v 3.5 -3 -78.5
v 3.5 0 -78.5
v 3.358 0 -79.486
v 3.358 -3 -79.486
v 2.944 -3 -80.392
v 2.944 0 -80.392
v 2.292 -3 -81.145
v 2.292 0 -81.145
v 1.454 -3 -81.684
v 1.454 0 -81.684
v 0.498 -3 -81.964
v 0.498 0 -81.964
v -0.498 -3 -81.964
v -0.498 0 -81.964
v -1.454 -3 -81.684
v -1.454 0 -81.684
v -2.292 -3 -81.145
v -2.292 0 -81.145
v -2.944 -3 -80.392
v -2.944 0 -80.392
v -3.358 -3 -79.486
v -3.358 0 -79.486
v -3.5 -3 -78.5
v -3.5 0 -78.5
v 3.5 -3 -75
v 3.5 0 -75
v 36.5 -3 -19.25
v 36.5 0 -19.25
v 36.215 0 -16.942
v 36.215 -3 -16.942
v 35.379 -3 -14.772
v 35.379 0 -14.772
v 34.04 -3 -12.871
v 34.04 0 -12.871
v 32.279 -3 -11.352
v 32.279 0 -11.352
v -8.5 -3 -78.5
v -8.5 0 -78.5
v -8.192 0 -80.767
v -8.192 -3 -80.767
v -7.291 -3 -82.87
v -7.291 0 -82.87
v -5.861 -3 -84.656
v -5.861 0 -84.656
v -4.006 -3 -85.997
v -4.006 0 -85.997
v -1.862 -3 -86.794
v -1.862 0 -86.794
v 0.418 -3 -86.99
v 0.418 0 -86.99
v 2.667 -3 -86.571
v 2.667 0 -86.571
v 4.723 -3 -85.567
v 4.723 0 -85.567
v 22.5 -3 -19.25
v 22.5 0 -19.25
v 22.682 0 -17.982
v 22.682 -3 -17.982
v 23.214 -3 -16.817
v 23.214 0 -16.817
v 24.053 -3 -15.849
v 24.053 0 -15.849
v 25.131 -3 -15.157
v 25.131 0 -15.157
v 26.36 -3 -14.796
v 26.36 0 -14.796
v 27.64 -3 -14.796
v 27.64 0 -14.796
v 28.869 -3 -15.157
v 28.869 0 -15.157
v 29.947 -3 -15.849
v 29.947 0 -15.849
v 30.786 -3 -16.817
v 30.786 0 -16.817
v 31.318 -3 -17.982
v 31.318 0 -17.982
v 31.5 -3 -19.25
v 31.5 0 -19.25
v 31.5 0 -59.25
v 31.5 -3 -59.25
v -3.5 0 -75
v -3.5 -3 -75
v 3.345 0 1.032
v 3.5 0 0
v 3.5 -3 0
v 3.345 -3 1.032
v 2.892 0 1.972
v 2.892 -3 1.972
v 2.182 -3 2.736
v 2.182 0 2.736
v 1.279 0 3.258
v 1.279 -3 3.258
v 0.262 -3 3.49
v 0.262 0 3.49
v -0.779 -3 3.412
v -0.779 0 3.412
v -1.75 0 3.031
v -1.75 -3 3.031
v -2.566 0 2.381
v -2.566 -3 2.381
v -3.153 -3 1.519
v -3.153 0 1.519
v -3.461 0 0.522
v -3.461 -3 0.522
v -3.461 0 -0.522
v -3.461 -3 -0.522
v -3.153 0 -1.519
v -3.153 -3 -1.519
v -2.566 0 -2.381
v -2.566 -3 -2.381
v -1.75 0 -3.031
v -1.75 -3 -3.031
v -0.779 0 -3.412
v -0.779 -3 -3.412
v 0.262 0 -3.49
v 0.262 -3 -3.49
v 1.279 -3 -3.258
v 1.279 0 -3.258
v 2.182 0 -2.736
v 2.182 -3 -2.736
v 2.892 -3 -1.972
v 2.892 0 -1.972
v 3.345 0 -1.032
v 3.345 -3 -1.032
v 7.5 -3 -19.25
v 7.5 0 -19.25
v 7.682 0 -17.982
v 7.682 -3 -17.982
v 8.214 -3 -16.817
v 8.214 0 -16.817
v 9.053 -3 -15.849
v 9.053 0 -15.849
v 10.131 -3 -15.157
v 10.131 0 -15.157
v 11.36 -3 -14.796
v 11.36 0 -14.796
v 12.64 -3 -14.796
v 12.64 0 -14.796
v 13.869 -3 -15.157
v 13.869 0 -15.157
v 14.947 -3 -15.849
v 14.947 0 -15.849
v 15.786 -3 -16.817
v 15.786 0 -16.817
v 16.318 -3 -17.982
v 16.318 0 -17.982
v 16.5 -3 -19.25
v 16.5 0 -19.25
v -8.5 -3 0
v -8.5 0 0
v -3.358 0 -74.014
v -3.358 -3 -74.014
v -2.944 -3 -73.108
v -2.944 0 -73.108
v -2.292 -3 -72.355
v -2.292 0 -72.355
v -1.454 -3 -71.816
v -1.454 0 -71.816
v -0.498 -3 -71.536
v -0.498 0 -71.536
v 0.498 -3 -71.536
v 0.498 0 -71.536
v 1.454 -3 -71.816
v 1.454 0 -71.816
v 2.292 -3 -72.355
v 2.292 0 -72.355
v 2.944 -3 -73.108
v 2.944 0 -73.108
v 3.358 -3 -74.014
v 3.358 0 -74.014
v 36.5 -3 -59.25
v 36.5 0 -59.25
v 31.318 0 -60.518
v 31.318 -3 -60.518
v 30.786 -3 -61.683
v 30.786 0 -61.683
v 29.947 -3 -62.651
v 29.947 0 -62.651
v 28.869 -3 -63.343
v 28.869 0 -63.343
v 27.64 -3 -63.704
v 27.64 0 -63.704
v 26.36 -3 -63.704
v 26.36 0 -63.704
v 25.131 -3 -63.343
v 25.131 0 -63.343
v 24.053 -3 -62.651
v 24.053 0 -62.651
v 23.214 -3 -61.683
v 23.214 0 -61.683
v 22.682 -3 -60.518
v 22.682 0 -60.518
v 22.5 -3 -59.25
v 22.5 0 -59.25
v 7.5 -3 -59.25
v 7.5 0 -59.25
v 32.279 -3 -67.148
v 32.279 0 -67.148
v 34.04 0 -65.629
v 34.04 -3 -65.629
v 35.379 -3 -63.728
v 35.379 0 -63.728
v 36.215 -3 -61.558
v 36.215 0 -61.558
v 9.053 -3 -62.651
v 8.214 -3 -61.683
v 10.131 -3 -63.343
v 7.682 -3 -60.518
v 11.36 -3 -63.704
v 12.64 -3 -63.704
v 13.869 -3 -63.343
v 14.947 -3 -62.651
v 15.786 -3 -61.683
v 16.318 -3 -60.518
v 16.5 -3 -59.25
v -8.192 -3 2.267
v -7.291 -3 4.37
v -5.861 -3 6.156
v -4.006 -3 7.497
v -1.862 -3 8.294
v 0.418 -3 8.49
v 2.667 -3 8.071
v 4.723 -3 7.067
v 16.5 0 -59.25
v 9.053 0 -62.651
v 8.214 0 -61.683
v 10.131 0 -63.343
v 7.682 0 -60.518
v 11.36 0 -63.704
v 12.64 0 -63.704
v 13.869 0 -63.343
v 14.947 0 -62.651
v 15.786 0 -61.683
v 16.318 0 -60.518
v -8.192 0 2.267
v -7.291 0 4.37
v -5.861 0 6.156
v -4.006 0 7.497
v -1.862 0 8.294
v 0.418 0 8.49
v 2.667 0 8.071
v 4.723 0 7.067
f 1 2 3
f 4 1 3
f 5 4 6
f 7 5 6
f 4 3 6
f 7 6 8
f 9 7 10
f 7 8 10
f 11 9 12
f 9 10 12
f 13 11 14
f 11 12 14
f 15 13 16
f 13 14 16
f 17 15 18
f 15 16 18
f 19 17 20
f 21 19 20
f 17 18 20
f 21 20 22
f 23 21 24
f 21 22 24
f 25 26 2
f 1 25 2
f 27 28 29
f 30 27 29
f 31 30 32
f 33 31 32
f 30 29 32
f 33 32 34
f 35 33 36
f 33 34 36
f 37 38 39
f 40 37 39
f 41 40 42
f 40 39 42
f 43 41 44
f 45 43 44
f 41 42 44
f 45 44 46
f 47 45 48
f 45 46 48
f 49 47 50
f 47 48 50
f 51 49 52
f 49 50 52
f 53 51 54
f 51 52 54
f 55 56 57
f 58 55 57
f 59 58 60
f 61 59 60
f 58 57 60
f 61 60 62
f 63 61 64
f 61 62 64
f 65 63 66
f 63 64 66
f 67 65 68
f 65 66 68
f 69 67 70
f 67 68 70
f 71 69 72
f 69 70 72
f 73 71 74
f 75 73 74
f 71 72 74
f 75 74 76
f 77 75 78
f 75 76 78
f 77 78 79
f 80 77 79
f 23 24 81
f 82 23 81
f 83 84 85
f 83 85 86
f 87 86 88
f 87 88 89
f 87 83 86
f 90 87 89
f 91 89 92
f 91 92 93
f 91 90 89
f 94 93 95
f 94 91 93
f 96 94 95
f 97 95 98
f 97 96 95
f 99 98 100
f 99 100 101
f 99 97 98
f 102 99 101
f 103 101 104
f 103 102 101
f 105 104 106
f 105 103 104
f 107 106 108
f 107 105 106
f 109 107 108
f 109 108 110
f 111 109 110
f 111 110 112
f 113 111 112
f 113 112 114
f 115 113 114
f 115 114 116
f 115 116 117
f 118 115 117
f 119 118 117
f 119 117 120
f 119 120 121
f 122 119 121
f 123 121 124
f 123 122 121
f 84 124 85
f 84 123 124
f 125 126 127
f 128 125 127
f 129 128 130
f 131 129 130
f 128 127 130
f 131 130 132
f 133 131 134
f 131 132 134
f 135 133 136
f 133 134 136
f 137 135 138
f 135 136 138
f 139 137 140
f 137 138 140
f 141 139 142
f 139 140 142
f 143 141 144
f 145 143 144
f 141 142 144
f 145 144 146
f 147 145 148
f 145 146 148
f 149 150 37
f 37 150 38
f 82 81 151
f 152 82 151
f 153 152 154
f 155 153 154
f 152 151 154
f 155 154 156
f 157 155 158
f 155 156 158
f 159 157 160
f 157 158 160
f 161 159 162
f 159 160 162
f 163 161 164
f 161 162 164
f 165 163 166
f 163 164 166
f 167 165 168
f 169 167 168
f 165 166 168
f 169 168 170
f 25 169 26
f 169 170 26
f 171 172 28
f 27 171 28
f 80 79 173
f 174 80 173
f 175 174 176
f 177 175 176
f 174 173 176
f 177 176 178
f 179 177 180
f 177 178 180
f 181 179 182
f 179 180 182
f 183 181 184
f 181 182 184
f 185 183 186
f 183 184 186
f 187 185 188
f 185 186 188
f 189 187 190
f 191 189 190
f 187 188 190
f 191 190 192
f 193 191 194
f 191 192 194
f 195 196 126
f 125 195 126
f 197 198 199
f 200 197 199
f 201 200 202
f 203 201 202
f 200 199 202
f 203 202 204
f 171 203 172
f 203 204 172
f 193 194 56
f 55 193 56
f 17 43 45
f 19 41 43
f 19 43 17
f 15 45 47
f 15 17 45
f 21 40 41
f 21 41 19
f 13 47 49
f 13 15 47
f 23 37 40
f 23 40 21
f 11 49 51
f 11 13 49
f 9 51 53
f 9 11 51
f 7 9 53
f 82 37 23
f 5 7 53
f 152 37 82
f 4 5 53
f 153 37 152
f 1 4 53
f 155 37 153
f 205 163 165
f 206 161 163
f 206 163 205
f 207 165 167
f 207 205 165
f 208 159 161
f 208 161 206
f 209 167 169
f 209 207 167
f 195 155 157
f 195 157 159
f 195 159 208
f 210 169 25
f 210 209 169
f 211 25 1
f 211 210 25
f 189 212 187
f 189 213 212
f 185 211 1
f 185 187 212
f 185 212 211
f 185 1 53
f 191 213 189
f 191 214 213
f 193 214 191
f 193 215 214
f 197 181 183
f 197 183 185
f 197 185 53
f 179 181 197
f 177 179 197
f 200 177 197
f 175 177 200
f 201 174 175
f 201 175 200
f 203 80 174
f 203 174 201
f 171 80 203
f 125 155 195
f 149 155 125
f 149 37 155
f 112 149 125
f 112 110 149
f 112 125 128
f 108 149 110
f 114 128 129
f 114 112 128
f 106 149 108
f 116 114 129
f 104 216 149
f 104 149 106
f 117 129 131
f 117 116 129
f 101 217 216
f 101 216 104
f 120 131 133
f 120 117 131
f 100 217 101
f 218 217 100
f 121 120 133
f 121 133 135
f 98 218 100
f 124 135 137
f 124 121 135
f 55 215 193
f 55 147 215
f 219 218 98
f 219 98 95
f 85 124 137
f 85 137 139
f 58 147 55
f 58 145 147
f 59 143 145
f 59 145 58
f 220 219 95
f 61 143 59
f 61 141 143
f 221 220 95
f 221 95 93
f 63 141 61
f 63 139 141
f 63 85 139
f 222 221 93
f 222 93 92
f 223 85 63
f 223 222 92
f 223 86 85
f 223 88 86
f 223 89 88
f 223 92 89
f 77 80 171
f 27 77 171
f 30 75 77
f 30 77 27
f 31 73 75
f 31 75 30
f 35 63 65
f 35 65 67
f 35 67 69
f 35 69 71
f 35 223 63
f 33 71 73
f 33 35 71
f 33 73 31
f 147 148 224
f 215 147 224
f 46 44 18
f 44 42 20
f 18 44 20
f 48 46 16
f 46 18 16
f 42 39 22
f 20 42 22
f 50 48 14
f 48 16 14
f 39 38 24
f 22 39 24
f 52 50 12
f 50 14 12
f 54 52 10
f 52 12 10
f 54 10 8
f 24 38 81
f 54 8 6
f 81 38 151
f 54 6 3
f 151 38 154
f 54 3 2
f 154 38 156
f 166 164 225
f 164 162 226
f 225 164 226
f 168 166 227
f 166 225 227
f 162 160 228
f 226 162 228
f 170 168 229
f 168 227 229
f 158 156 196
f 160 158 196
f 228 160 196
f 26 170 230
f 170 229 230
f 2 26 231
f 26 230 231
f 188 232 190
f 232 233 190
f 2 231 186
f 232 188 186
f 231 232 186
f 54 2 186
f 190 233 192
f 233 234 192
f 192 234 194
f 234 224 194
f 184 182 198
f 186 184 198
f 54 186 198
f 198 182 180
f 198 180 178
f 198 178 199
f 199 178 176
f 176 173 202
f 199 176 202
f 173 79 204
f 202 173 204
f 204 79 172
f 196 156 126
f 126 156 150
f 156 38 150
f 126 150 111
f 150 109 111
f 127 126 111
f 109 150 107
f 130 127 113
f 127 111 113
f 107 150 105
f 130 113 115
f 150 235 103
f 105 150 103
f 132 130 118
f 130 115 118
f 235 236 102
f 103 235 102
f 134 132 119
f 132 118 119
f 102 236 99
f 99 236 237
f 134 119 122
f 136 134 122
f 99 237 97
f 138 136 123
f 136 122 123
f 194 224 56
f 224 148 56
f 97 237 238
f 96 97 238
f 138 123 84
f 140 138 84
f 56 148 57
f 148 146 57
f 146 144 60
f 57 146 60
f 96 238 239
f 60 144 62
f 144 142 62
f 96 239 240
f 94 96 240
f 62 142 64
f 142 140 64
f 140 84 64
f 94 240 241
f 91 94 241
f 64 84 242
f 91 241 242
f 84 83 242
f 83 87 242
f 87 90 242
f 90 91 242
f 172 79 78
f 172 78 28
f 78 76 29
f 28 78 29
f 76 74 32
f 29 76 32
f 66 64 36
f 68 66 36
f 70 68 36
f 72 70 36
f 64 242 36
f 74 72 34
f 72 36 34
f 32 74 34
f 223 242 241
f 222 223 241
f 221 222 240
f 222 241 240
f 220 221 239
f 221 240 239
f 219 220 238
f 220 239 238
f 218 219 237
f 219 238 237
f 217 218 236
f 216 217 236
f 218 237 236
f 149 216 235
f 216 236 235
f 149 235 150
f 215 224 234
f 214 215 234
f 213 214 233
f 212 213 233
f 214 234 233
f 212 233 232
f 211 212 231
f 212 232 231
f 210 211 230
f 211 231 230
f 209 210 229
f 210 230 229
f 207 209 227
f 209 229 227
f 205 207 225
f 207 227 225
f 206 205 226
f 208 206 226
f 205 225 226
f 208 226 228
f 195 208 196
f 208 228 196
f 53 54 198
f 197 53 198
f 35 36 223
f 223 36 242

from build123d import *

# Parameters (mm, degrees)
F0_R     = 3.5
F1_DEPTH = 3


with BuildPart() as f1:
    # F0 (on Front) → F1 (new body)
    with BuildSketch(Plane.XZ):
        with BuildLine():
            Line((32.279203, -11.351898), (4.723497, 7.066723))
            ThreePointArc((4.723497, 7.066723), (-4.006262, 7.496657), (-8.5, 0))
            Line((-8.5, 0), (-8.5, -78.5))
            ThreePointArc((-8.5, -78.5), (-4.006262, -85.996657), (4.723497, -85.566723))
            Line((4.723497, -85.566723), (32.279203, -67.148102))
            ThreePointArc((32.279203, -67.148102), (35.378616, -63.727587), (36.5, -59.25))
            Line((36.5, -59.25), (36.5, -19.25))
            ThreePointArc((36.5, -19.25), (35.378616, -14.772413), (32.279203, -11.351898))
        make_face()
        with BuildLine():
            ThreePointArc((-3.5, -75), (0, -71.5), (3.5, -75))
            Line((3.5, -75), (3.5, -78.5))
            ThreePointArc((3.5, -78.5), (0, -82), (-3.5, -78.5))
            Line((-3.5, -78.5), (-3.5, -75))
        make_face(mode=Mode.SUBTRACT)
        with BuildLine():
            ThreePointArc((7.5, -19.25), (12, -14.75), (16.5, -19.25))
            Line((16.5, -19.25), (16.5, -59.25))
            ThreePointArc((16.5, -59.25), (12, -63.75), (7.5, -59.25))
            Line((7.5, -59.25), (7.5, -19.25))
        make_face(mode=Mode.SUBTRACT)
        Circle(F0_R, mode=Mode.SUBTRACT)
        with BuildLine():
            ThreePointArc((22.5, -19.25), (27, -14.75), (31.5, -19.25))
            Line((31.5, -19.25), (31.5, -59.25))
            ThreePointArc((31.5, -59.25), (27, -63.75), (22.5, -59.25))
            Line((22.5, -59.25), (22.5, -19.25))
        make_face(mode=Mode.SUBTRACT)
    extrude(amount=F1_DEPTH)


solid = f1.part
